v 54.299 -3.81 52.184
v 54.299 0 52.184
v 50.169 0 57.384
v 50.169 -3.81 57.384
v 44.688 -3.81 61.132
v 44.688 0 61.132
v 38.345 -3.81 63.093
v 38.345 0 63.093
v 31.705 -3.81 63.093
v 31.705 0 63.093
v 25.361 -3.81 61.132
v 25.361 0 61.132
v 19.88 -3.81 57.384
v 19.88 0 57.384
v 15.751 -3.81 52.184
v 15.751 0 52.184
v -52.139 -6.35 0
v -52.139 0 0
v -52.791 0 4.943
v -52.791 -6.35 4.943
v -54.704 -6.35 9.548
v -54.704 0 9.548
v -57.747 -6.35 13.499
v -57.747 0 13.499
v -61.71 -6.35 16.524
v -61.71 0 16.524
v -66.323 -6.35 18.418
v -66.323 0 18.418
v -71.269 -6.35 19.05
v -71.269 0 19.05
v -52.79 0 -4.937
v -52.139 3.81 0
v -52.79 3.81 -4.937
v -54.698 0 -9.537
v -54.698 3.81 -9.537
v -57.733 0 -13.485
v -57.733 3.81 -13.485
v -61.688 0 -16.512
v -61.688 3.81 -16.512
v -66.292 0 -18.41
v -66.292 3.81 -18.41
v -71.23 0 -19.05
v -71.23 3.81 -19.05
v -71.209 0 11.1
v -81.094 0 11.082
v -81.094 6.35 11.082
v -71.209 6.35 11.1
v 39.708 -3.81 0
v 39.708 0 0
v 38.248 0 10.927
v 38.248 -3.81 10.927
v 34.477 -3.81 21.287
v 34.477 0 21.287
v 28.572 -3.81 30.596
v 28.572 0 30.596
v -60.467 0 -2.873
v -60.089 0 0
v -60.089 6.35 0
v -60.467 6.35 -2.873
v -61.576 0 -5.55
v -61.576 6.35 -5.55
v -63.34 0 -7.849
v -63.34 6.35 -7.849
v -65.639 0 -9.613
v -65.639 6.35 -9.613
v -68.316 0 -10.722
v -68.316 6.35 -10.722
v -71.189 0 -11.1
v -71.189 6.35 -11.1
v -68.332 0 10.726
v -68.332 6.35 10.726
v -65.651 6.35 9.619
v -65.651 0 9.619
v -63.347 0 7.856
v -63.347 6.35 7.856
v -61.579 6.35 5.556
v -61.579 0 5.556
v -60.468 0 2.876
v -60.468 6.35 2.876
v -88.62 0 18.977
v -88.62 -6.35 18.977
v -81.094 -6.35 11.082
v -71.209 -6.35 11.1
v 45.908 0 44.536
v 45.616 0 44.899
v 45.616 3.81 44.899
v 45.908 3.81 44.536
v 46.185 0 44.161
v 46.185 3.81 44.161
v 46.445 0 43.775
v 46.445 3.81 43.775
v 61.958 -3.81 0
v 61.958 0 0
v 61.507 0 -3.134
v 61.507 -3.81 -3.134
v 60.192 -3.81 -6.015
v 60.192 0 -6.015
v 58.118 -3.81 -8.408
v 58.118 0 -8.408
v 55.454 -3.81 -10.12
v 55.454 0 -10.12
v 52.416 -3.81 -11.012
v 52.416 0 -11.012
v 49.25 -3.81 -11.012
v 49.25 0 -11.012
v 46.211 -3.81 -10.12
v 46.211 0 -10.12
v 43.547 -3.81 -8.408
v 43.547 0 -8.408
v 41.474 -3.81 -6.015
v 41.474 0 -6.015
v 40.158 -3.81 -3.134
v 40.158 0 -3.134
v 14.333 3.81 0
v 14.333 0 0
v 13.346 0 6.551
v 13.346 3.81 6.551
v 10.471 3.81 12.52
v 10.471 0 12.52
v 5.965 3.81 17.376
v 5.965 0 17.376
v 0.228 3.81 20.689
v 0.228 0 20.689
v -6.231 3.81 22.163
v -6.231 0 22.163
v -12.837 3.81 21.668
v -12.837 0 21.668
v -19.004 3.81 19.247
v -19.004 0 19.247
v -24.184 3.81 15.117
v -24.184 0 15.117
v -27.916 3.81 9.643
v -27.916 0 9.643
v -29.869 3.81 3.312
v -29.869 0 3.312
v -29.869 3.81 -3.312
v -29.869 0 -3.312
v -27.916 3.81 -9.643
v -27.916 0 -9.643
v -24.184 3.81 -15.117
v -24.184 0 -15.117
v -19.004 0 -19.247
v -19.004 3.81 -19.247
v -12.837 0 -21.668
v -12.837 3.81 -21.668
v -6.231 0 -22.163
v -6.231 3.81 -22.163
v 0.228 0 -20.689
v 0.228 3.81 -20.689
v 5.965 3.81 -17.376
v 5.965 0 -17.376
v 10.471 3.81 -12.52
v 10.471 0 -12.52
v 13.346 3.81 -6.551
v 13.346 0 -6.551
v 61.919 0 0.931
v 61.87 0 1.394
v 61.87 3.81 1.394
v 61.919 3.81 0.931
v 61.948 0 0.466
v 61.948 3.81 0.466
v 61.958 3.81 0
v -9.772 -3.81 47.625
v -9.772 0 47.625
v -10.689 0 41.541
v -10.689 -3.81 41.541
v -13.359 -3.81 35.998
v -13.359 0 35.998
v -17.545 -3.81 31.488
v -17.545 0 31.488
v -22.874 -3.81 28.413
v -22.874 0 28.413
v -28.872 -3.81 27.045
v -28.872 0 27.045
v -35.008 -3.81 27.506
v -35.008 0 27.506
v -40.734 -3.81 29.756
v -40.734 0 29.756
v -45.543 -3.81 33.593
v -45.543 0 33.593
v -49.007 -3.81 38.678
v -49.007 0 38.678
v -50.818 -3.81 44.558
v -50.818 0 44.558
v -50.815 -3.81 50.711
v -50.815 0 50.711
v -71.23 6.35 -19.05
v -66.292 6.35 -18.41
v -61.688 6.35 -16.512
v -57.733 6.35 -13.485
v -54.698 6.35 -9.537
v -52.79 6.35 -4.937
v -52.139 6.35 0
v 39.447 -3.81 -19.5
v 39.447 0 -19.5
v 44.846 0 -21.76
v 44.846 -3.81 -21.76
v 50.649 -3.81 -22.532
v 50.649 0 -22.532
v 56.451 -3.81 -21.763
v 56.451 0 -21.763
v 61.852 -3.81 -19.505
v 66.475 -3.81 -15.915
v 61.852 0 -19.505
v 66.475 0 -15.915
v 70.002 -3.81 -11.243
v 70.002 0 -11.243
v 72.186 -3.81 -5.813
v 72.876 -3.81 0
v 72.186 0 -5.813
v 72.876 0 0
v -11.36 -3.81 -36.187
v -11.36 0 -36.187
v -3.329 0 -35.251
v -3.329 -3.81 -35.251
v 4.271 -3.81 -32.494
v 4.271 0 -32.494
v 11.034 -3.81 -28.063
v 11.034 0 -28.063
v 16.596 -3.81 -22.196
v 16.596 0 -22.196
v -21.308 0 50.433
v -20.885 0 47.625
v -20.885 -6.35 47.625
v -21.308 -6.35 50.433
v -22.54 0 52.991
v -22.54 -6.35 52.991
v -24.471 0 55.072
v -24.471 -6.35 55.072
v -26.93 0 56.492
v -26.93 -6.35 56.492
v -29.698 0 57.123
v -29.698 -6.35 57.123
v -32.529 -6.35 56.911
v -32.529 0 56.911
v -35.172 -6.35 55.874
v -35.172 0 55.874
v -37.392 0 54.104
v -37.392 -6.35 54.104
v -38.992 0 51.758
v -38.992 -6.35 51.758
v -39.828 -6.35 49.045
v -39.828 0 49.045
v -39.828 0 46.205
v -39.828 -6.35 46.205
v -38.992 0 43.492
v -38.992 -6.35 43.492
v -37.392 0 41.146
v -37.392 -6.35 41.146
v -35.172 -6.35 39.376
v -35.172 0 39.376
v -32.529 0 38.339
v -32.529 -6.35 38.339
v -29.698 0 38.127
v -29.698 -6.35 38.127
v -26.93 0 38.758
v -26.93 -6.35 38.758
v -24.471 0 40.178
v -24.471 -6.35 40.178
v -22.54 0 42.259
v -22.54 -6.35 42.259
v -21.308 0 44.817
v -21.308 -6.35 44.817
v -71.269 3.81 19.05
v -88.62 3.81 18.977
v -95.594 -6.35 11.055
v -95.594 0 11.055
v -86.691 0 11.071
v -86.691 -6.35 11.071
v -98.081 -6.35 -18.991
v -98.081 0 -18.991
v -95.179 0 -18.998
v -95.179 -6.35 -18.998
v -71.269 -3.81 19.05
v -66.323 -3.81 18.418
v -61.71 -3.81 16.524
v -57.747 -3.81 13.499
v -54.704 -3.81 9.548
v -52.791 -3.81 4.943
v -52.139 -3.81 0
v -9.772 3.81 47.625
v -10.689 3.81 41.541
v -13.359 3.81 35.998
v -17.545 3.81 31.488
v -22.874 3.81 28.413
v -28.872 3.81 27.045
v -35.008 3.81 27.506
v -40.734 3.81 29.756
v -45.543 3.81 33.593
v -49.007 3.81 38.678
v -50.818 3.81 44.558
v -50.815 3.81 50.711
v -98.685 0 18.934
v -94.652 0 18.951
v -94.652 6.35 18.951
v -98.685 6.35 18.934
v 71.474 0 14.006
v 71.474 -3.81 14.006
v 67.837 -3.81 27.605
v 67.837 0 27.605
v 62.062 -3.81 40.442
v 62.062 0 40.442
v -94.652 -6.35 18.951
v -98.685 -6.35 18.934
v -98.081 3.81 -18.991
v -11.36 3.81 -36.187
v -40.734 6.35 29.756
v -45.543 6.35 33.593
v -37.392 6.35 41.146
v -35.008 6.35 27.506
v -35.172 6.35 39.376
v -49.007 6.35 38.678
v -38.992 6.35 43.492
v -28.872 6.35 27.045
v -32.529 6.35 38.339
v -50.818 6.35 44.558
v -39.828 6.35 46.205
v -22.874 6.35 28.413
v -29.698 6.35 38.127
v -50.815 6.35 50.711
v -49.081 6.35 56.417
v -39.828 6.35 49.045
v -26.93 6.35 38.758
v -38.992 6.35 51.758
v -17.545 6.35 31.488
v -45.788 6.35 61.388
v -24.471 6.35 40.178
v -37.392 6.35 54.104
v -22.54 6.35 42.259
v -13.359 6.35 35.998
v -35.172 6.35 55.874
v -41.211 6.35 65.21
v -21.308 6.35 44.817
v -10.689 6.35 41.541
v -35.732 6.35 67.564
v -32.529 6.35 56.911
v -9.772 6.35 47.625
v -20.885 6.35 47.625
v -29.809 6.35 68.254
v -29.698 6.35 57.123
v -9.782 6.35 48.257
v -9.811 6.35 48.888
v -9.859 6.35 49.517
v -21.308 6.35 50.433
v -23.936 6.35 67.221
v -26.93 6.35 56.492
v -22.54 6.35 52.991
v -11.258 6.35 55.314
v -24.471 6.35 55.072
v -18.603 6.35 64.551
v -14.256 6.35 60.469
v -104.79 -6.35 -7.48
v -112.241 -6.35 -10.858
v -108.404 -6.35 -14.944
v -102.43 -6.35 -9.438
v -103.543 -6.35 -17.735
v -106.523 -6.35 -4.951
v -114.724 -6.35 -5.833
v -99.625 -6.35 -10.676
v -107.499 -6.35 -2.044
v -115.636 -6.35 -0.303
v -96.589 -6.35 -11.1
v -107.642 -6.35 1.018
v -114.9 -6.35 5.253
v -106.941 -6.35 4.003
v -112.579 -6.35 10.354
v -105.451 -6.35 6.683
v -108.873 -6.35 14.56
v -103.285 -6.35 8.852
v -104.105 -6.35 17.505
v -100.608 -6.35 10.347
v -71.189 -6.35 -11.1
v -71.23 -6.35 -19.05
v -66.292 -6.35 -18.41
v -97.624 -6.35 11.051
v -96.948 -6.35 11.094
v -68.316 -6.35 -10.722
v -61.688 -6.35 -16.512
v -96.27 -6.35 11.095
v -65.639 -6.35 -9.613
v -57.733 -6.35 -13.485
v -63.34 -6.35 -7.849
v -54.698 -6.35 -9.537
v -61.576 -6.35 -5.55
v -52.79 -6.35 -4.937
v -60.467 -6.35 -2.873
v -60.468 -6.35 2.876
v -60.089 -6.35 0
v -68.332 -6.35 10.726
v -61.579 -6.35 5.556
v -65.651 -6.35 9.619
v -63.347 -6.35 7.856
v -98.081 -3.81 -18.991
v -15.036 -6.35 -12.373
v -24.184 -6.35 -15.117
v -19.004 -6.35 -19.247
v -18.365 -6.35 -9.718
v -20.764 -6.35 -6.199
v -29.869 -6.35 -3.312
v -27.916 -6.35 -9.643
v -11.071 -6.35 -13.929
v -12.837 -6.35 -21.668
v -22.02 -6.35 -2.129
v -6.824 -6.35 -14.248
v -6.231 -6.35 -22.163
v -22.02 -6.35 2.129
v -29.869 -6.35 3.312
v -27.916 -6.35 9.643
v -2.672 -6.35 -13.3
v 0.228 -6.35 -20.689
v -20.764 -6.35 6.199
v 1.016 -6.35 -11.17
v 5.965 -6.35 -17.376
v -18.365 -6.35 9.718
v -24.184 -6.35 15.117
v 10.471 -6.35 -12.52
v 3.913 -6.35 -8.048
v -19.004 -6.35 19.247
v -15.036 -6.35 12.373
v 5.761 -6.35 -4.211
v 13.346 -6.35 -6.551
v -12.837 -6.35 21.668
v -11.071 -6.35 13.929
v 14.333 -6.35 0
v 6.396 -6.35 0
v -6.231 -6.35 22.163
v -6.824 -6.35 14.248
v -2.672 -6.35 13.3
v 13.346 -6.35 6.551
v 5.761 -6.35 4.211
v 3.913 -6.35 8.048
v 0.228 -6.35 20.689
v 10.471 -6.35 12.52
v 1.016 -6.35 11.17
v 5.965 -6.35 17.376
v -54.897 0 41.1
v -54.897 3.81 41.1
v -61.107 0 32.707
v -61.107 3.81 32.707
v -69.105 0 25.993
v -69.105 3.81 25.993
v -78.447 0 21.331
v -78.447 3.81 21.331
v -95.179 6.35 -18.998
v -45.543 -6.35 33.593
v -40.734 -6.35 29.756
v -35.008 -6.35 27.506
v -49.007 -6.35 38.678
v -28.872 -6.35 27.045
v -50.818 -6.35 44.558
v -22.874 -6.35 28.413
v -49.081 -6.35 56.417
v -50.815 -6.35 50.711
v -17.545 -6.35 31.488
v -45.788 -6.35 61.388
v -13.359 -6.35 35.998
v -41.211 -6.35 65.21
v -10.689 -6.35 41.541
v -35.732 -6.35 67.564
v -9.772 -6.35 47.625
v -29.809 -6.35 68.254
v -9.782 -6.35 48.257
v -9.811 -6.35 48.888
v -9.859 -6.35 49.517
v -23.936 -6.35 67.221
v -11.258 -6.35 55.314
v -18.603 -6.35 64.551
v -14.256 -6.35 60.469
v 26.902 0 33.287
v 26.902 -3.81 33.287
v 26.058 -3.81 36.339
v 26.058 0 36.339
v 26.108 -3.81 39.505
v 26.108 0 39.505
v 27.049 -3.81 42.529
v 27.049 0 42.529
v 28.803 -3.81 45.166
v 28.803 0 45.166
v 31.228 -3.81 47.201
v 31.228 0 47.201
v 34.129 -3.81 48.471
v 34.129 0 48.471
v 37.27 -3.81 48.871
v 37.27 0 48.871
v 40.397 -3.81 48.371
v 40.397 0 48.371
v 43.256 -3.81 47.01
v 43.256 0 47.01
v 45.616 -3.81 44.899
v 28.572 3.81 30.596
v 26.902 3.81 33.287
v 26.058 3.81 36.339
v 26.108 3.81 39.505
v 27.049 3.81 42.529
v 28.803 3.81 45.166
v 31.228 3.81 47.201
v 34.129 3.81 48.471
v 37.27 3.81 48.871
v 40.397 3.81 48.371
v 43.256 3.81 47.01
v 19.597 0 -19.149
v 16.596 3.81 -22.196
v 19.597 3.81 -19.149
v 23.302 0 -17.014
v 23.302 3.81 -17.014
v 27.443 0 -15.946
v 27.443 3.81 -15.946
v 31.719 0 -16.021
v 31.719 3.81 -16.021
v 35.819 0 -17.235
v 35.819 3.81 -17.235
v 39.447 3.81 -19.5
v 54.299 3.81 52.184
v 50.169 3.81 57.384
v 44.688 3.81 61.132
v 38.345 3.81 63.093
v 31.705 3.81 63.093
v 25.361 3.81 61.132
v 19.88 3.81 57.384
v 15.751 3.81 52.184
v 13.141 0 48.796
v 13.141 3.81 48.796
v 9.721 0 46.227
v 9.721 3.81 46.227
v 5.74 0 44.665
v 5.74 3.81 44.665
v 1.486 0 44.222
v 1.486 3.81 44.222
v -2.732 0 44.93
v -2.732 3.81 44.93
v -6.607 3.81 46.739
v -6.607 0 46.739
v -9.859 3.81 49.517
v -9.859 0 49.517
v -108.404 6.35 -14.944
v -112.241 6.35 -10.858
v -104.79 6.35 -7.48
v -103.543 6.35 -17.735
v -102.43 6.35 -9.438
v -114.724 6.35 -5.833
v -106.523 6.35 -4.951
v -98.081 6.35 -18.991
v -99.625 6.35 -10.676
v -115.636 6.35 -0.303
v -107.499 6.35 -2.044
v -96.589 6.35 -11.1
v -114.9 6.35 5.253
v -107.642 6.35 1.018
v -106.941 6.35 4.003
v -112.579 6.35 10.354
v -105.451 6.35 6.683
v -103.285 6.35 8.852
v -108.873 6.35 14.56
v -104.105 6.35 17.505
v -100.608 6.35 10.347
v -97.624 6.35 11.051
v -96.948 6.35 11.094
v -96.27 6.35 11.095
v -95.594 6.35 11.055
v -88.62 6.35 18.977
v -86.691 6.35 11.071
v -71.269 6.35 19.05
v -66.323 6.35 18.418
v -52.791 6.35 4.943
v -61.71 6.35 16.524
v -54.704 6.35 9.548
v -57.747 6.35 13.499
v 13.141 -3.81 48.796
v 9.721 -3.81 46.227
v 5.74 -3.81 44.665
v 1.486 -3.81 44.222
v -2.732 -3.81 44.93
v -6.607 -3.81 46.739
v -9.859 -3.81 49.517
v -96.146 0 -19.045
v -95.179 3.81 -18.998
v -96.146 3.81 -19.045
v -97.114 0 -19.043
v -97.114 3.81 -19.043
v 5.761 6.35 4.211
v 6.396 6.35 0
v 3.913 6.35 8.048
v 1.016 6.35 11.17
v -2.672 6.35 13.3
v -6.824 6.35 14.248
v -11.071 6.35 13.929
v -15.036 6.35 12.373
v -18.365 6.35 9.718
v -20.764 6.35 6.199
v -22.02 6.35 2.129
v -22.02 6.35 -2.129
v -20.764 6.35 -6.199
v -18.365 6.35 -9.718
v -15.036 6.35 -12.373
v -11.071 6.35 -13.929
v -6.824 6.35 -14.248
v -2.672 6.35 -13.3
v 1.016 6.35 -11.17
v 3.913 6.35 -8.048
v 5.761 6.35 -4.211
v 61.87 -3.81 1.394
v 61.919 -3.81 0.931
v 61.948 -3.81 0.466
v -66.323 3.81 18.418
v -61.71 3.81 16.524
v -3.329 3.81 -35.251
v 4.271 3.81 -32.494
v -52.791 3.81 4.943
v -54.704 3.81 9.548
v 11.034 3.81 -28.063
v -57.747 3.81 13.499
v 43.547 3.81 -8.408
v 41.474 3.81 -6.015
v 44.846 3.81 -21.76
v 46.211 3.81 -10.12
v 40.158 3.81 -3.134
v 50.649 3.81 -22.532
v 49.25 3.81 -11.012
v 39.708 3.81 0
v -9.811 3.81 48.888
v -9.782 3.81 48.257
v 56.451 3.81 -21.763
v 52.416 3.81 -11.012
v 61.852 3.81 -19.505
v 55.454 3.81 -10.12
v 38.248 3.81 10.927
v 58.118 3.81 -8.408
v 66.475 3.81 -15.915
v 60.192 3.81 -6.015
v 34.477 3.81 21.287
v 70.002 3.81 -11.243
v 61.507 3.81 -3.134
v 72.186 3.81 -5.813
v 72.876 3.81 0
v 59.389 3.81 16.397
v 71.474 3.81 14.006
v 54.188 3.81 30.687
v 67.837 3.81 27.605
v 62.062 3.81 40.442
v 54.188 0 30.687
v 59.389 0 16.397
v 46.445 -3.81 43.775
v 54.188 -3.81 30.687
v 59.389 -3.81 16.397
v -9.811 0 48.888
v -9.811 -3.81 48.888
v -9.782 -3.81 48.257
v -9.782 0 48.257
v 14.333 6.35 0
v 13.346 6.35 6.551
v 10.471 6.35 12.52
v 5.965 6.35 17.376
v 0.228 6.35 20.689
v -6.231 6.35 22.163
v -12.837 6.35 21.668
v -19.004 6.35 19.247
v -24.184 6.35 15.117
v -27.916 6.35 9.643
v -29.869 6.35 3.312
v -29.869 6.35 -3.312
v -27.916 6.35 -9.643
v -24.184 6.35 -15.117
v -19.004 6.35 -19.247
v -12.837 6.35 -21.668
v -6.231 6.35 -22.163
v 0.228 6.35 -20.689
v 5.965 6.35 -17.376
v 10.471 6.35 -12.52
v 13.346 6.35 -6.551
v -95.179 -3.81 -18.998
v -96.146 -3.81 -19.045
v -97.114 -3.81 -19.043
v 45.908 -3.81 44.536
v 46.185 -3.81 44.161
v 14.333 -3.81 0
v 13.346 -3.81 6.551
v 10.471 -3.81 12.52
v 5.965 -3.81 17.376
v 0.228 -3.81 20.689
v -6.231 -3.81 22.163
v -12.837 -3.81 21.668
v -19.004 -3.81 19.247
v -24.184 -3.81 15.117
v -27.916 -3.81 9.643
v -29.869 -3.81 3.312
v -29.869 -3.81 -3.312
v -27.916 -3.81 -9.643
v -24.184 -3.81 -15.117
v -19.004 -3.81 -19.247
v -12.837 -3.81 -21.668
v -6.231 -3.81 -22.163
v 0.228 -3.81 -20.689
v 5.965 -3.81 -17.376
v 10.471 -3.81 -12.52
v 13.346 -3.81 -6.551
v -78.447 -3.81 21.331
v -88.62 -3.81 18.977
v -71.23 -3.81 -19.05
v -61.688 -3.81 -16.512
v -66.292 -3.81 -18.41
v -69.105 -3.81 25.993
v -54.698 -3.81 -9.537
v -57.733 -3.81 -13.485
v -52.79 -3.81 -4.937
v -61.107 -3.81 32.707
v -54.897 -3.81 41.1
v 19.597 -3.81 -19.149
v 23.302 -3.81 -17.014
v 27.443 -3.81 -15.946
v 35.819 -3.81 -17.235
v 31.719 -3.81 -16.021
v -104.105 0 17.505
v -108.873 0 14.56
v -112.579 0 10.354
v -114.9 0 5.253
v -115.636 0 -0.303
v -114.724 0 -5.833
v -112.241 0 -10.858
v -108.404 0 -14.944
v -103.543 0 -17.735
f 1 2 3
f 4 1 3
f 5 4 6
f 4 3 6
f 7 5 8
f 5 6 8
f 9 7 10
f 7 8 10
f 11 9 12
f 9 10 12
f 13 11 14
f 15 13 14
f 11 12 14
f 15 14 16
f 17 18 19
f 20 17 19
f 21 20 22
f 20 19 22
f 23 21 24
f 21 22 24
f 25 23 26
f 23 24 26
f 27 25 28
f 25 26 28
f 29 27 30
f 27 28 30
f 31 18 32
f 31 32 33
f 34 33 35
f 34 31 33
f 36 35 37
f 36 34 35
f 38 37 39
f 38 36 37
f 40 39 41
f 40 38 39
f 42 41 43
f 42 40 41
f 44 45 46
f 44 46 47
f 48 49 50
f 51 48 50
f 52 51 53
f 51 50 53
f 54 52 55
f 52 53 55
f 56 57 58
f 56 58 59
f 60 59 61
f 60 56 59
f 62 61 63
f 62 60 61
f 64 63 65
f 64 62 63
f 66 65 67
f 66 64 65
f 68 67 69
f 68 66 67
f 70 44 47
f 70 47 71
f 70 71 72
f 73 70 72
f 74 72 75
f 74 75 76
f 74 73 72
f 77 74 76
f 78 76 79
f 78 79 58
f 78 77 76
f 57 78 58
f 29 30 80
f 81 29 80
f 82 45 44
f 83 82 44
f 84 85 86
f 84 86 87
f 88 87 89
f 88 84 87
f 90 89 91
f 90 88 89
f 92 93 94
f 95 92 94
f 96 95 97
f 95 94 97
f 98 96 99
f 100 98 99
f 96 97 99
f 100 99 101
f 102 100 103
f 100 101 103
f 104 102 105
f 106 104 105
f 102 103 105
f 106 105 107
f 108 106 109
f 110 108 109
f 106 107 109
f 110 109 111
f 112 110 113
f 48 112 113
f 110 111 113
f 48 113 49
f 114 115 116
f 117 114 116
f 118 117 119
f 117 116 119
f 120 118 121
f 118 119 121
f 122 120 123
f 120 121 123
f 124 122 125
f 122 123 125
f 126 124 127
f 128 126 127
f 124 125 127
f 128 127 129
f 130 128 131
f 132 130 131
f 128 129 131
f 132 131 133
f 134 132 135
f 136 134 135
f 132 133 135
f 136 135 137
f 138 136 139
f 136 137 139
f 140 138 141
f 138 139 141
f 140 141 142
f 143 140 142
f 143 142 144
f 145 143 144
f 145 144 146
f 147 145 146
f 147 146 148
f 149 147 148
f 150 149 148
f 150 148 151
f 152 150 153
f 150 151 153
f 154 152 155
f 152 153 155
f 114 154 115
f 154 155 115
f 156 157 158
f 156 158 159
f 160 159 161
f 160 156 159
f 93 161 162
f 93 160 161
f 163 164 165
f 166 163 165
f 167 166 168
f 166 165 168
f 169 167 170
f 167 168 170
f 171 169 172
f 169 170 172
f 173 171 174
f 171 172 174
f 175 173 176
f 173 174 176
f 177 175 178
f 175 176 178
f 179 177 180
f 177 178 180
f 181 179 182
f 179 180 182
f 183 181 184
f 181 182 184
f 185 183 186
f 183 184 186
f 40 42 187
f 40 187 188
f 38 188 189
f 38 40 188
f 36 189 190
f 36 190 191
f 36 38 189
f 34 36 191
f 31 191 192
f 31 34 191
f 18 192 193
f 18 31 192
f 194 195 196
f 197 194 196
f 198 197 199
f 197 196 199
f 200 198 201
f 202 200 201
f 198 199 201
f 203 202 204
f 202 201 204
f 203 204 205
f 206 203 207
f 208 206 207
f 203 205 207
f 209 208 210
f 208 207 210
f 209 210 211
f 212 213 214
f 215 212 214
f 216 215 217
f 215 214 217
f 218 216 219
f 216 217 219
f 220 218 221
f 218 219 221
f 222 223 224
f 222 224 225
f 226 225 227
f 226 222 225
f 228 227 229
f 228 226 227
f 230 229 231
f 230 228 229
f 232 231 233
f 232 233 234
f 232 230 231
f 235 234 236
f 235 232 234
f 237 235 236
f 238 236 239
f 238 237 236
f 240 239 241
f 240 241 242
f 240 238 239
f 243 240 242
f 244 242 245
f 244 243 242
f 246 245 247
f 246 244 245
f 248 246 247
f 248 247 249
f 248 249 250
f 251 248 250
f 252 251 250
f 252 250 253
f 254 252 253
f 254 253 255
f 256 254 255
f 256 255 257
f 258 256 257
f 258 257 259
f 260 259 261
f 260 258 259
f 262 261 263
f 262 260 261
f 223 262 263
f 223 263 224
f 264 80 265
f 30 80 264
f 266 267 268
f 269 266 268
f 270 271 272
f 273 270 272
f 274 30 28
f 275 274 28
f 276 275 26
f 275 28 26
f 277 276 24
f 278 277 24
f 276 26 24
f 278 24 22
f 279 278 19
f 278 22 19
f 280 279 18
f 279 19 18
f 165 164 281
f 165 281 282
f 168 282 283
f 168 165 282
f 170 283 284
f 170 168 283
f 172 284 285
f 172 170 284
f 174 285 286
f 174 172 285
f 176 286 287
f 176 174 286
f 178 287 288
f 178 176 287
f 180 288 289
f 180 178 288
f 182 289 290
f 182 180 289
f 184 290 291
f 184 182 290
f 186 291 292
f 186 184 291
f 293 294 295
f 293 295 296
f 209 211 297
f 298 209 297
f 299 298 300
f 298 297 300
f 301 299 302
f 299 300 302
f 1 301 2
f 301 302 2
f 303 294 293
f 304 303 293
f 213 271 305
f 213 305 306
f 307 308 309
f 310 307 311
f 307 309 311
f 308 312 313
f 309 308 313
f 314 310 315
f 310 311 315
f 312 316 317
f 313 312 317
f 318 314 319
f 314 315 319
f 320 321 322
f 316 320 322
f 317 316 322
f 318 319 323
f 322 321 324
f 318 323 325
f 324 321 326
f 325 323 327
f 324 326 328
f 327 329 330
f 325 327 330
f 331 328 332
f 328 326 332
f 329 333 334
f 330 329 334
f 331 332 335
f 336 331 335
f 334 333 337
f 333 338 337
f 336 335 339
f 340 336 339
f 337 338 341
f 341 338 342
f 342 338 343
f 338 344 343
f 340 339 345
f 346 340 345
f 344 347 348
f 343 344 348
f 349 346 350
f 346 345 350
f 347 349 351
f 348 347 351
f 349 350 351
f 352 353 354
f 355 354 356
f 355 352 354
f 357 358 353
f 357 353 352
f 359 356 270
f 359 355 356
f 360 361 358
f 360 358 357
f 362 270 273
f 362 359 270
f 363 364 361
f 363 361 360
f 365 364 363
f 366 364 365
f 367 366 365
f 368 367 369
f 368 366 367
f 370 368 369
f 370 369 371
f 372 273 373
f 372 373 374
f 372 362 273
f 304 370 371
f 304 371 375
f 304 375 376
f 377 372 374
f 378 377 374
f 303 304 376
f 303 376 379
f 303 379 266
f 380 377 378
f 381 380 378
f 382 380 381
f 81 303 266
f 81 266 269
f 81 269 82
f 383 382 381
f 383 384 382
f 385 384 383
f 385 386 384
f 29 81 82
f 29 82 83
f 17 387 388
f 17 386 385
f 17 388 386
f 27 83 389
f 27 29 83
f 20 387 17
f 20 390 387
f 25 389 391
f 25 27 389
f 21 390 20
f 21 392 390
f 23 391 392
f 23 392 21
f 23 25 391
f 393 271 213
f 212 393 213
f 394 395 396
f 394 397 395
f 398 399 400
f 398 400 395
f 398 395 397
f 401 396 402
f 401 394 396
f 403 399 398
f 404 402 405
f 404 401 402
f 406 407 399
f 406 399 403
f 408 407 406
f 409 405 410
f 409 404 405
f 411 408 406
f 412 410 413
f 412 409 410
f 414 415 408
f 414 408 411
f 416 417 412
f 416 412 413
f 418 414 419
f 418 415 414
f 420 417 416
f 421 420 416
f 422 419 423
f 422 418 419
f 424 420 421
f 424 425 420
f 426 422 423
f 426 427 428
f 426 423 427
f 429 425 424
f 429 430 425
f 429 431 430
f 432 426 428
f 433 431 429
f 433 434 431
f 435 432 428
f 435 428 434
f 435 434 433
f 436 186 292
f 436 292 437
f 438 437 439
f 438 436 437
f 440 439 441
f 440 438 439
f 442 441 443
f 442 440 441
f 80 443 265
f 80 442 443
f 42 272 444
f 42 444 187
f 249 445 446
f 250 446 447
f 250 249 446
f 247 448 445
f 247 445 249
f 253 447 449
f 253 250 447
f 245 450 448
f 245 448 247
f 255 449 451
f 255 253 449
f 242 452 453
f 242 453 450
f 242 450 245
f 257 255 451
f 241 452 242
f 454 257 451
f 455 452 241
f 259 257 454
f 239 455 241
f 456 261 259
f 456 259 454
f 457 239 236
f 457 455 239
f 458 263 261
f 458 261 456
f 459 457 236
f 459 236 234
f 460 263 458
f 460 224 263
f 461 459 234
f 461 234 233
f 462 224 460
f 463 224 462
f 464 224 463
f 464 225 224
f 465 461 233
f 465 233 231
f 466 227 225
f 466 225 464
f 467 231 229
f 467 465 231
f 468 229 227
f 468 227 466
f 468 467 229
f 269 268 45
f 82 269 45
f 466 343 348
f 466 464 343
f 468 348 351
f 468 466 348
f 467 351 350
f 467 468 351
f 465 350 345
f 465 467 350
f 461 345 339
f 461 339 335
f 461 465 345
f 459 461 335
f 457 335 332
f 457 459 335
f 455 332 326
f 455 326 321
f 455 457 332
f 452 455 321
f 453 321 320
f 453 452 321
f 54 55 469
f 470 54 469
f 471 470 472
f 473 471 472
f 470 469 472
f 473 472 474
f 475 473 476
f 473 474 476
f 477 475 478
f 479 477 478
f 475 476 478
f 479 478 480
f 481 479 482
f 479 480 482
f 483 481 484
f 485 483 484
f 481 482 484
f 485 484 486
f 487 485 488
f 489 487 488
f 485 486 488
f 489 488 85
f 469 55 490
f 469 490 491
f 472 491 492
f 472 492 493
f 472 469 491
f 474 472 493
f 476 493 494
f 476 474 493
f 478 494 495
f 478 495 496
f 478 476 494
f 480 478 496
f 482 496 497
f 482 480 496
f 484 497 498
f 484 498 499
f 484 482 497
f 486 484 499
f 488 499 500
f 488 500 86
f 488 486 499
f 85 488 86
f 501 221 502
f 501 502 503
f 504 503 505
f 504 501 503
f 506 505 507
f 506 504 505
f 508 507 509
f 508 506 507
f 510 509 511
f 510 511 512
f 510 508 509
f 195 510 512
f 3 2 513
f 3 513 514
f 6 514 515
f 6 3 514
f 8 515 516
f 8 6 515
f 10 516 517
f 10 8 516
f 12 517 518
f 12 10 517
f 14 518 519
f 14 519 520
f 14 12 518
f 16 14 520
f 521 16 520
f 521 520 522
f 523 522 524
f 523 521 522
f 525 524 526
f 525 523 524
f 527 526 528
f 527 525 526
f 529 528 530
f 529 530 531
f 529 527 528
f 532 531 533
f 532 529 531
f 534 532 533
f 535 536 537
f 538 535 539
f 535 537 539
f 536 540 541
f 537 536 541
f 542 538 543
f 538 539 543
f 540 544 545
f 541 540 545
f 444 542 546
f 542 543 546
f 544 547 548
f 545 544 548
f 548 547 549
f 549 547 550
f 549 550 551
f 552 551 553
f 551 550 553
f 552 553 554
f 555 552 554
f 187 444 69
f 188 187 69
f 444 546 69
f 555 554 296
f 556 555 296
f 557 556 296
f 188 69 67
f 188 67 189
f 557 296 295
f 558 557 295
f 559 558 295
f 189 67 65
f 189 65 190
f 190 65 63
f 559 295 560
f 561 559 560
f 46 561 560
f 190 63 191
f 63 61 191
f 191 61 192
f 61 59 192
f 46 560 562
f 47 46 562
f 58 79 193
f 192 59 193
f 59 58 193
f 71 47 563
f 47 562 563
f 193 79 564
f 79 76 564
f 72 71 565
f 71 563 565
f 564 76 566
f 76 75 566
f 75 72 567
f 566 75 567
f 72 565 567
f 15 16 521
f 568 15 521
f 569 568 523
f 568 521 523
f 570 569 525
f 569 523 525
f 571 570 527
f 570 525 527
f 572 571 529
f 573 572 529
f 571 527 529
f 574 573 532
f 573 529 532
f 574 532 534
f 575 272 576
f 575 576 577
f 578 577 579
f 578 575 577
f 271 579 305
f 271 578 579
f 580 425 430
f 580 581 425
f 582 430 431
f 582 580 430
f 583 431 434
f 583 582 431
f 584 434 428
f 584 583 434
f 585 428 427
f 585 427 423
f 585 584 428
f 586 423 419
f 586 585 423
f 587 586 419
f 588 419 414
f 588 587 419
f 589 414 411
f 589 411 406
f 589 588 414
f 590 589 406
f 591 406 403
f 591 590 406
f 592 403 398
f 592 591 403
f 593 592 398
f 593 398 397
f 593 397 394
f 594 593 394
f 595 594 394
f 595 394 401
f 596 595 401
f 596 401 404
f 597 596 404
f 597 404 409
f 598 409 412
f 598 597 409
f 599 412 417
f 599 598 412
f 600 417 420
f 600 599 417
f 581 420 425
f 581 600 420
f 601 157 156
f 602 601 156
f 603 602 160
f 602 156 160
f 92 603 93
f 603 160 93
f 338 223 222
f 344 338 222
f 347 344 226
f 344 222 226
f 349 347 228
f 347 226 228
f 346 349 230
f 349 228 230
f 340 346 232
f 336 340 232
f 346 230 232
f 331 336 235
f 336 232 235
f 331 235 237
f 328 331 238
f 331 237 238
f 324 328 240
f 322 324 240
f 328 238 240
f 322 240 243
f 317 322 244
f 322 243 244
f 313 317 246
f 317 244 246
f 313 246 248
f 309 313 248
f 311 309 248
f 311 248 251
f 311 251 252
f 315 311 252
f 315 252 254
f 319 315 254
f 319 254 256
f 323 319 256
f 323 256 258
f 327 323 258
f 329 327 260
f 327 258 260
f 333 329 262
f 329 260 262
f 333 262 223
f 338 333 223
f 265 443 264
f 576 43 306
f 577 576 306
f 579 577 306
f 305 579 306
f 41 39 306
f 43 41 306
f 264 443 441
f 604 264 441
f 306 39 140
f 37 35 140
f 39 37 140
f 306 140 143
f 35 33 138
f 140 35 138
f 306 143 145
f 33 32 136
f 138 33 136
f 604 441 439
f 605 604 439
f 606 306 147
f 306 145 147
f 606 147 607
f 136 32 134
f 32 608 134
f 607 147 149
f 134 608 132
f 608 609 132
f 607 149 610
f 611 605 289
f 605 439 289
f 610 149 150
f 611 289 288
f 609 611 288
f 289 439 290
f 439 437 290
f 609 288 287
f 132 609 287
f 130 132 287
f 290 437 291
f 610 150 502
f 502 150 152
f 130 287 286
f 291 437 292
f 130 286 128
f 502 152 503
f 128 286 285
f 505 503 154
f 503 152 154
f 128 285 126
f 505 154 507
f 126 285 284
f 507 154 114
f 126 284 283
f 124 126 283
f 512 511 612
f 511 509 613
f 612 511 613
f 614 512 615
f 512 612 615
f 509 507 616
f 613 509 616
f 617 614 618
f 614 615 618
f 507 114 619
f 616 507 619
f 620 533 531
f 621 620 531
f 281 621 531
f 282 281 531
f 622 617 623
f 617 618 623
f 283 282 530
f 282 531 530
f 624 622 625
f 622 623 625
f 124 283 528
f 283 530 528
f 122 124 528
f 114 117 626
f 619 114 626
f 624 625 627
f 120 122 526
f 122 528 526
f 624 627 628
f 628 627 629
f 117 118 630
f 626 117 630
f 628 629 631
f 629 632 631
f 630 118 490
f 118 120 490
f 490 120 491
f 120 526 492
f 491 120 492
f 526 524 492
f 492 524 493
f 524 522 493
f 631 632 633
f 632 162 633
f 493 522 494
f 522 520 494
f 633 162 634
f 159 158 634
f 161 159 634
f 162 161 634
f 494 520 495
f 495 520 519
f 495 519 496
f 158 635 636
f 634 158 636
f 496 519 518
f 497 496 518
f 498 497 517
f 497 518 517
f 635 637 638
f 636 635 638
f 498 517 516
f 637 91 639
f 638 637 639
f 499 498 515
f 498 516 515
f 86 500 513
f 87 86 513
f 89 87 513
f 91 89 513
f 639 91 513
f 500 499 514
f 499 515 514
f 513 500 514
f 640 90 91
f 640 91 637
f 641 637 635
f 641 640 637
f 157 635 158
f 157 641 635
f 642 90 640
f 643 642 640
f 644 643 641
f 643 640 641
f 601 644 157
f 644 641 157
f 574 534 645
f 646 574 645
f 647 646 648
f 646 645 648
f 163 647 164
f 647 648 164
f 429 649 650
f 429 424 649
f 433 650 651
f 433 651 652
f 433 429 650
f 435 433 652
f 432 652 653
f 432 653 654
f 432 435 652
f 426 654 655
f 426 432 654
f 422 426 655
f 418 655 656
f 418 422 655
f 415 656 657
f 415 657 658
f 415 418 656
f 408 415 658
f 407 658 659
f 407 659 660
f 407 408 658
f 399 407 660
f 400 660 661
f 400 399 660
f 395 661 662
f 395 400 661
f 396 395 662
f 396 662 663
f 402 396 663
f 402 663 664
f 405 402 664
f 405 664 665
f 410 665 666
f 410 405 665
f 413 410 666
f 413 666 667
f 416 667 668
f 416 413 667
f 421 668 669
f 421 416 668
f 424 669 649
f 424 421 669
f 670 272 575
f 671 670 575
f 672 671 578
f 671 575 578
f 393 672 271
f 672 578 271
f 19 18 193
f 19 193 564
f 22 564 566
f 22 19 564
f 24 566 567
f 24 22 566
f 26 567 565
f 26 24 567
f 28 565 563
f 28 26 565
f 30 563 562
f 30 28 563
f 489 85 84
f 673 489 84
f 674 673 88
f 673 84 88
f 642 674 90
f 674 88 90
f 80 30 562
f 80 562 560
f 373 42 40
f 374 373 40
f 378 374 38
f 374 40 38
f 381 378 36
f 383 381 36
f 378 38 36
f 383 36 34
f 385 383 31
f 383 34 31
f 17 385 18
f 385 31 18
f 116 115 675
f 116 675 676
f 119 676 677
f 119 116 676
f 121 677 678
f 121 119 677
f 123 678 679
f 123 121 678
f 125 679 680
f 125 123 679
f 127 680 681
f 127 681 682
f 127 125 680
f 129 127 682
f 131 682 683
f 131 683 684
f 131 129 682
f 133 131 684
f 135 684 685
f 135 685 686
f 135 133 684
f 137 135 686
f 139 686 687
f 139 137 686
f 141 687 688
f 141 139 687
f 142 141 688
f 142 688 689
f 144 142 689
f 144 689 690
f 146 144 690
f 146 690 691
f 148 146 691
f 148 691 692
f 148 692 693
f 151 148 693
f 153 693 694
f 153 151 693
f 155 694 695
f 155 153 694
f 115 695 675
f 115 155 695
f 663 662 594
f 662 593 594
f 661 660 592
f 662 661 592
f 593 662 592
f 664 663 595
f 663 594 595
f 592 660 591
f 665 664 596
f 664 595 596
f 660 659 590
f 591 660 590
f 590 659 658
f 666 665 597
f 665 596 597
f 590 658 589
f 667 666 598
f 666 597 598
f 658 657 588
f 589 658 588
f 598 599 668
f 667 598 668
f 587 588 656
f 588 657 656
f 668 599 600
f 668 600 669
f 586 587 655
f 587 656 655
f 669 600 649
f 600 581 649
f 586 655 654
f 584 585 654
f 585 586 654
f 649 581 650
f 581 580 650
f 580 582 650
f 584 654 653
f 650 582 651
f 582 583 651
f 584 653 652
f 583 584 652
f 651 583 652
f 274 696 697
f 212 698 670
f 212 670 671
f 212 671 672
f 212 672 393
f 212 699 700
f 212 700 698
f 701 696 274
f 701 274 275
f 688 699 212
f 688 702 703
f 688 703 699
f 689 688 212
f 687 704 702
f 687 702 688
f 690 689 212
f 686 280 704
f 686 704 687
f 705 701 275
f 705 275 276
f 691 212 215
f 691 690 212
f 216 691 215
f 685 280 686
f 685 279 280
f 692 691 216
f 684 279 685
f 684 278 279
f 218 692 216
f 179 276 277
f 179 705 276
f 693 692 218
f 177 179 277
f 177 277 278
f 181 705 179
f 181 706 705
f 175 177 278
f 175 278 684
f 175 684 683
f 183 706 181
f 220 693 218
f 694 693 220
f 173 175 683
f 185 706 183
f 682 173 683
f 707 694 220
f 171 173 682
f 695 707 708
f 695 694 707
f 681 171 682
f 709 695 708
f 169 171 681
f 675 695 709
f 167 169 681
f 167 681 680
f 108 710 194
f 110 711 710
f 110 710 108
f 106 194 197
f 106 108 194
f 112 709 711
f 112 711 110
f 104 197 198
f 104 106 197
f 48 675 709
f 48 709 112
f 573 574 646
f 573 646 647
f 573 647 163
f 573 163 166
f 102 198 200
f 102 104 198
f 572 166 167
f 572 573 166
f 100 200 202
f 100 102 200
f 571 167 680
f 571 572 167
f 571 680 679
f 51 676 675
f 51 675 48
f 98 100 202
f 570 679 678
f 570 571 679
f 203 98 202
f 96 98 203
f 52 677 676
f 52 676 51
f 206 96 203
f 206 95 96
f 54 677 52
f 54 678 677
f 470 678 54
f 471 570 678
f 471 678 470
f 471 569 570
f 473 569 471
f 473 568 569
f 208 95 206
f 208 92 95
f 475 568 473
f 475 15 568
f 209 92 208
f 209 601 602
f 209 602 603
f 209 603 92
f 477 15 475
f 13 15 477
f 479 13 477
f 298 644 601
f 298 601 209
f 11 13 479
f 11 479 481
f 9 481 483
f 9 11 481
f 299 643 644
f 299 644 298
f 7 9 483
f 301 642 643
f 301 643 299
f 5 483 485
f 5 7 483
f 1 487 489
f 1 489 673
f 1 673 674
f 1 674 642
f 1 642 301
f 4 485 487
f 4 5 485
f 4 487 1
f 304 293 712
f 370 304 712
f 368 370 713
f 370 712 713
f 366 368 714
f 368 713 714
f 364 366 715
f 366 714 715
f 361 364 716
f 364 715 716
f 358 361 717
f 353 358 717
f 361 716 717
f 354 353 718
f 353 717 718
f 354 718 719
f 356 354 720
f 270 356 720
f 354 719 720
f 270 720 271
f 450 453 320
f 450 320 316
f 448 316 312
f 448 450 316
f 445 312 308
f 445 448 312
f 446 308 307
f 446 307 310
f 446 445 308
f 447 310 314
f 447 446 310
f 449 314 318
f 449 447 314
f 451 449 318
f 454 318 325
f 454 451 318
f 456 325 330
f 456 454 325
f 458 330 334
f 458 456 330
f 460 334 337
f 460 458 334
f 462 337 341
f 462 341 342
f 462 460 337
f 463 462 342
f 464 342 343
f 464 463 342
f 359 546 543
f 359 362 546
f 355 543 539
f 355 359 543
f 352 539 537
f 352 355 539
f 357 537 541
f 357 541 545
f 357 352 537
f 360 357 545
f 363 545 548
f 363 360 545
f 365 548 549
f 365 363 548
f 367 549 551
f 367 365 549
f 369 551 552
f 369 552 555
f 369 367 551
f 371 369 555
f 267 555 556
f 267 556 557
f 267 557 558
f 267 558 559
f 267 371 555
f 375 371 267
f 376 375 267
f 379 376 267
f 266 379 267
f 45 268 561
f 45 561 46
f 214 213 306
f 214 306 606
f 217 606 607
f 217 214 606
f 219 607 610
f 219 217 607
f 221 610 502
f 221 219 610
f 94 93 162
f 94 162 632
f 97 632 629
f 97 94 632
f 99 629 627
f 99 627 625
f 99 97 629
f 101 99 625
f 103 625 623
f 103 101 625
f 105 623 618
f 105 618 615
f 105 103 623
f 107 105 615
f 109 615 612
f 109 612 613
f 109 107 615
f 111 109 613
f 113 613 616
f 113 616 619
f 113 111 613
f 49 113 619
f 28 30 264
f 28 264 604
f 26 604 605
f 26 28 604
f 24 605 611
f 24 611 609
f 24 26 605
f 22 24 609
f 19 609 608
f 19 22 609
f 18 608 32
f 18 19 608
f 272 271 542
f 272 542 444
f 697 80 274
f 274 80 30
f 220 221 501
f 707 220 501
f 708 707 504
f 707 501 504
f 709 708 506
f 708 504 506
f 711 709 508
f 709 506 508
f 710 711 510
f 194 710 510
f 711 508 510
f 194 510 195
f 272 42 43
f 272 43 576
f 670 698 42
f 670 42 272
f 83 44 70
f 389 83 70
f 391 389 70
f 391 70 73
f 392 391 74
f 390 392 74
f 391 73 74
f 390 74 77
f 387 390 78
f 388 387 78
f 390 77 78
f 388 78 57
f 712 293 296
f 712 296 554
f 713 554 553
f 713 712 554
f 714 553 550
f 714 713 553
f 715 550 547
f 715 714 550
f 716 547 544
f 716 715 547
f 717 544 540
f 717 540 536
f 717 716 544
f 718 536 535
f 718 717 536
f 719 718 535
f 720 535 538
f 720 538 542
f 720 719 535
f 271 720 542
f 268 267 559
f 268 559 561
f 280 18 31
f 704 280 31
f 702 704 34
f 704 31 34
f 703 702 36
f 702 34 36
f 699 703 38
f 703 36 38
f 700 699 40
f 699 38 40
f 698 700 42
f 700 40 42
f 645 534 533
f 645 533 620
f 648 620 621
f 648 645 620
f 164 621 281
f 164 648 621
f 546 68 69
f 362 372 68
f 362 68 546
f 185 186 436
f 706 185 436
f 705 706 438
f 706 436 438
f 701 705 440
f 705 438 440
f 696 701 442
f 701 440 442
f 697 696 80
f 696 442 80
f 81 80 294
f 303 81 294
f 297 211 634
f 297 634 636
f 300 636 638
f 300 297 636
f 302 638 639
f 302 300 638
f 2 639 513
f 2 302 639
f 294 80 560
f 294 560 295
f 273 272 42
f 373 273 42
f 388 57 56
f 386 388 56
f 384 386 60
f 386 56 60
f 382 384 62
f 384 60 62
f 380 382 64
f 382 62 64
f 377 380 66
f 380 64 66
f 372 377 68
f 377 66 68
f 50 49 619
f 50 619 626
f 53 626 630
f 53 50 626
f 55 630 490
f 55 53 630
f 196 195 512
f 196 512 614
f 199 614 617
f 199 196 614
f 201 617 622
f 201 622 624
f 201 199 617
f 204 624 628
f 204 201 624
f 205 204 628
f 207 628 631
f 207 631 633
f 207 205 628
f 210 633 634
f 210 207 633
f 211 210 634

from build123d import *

# Parameters (mm, degrees)
F0_R     = 22.225
F1_DEPTH = 3.81
F2_DEPTH = 6.35
F0_R_2   = 9.525
F0_R_3   = 14.2875


with BuildPart() as f1:
    # F0 (on Front) → F1 (new body, symmetric)
    with BuildSketch(Plane.XZ):
        with BuildLine():
            Line((-71.2302067148, -19.0499547752), (-95.1790091363, -18.9977704048))
            ThreePointArc((-95.1790091363, -18.9977704048), (-96.6302067148, -19.0499547752), (-98.0811630947, -18.9914466199))
            Line((-98.0811630947, -18.9914466199), (-11.3598450249, -36.1872298845))
            ThreePointArc((-11.3598450249, -36.1872298845), (4.2709346458, -32.4941742986), (16.5960399757, -22.1960331421))
            ThreePointArc((16.5960399757, -22.1960331421), (27.4429735853, -15.9457724279), (39.4467694666, -19.4997296822))
            ThreePointArc((39.4467694666, -19.4997296822), (61.8517288175, -19.5048009495), (72.8764723136, 0))
            ThreePointArc((72.8764723136, 0), (67.8374893071, 27.6050269049), (54.2986201889, 52.1840399681))
            ThreePointArc((54.2986201889, 52.1840399681), (35.0247812601, 63.3424344385), (15.7509423313, 52.1840399681))
            ThreePointArc((15.7509423313, 52.1840399681), (3.628009846, 44.2991231357), (-9.8592897487, 49.517375251))
            ThreePointArc((-9.8592897487, 49.517375251), (-9.7940926646, 48.5721857626), (-9.7723450249, 47.625))
            ThreePointArc((-9.7723450249, 47.625), (-31.9572082975, 27.0455910398), (-50.8153078986, 50.7110154181))
            ThreePointArc((-50.8153078986, 50.7110154181), (-64.9081681748, 29.1142899479), (-88.6201192568, 18.9767045507))
            Line((-88.6201192568, 18.9767045507), (-71.2689823238, 19.0498308196))
            ThreePointArc((-71.2689823238, 19.0498308196), (-57.7467278848, 13.4987395145), (-52.1386969191, 0))
            ThreePointArc((-52.1386969191, 0), (-57.7329966699, -13.4850521246), (-71.2302067148, -19.0499547752))
        make_face()
        with Locations((-7.8918969191, 0)):
            Circle(F0_R, mode=Mode.SUBTRACT)
        with BuildLine():
            ThreePointArc((61.9581030809, 0), (50.8329030809, -11.1252), (39.7077030809, 0))
            ThreePointArc((39.7077030809, 0), (36.6426092928, 16.2092346589), (28.5715121556, 30.596433106))
            ThreePointArc((28.5715121556, 30.596433106), (29.9427690789, 46.2699714599), (45.6163074327, 44.8987145366))
            ThreePointArc((45.6163074327, 44.8987145366), (46.0483474014, 44.3497039456), (46.4450767121, 43.7746587147))
            ThreePointArc((46.4450767121, 43.7746587147), (57.1198457607, 23.6623392132), (61.8704480271, 1.3937993402))
            ThreePointArc((61.8704480271, 1.3937993402), (61.9361676926, 0.6982764512), (61.9581030809, 0))
        make_face(mode=Mode.SUBTRACT)
    extrude(amount=F1_DEPTH, both=True)


with BuildPart() as f2:
    # F0 (on Front) → F2 (new body, symmetric)
    with BuildSketch(Plane.XZ):
        with BuildLine():
            ThreePointArc((-96.5886969191, -11.0998), (-107.6764020371, -0.5180301702), (-97.6236283177, 11.0514468302))
            ThreePointArc((-97.6236283177, 11.0514468302), (-96.6090077674, 11.0997814172), (-95.5942171229, 11.0551603324))
            Line((-95.5942171229, 11.0551603324), (-86.6911309222, 11.0714515751))
            ThreePointArc((-86.6911309222, 11.0714515751), (-85.3763591725, 12.7126999407), (-83.8886969191, 14.1990316571))
            ThreePointArc((-83.8886969191, 14.1990316571), (-88.8942032902, 17.4269121704), (-94.6518588651, 18.9512838181))
            Line((-94.6518588651, 18.9512838181), (-98.6852034909, 18.9342853098))
            ThreePointArc((-98.6852034909, 18.9342853098), (-115.6362812002, -0.3033695006), (-98.0811630947, -18.9914466199))
            Line((-98.0811630947, -18.9914466199), (-95.1790091363, -18.9977704048))
            ThreePointArc((-95.1790091363, -18.9977704048), (-89.1369994129, -17.5321049585), (-83.8886969191, -14.1990316571))
            ThreePointArc((-83.8886969191, -14.1990316571), (-85.3647221317, -12.7256751951), (-86.6708459935, -11.0998))
            Line((-86.6708459935, -11.0998), (-96.5886969191, -11.0998))
        make_face()
        with BuildLine():
            Line((-81.1065478448, -11.0998), (-86.6708459935, -11.0998))
            ThreePointArc((-86.6708459935, -11.0998), (-85.3647221317, -12.7256751951), (-83.8886969191, -14.1990316571))
            ThreePointArc((-83.8886969191, -14.1990316571), (-82.4126717065, -12.7256751951), (-81.1065478448, -11.0998))
        make_face()
        with BuildLine():
            ThreePointArc((-83.8886969191, 14.1990316571), (-85.3763591725, 12.7126999407), (-86.6911309222, 11.0714515751))
            Line((-86.6911309222, 11.0714515751), (-81.0935830583, 11.0816942043))
            ThreePointArc((-81.0935830583, 11.0816942043), (-82.4052361424, 12.7173873258), (-83.8886969191, 14.1990316571))
        make_face()
        with BuildLine():
            Line((-71.1886969191, -11.0998), (-81.1065478448, -11.0998))
            ThreePointArc((-81.1065478448, -11.0998), (-82.4126717065, -12.7256751951), (-83.8886969191, -14.1990316571))
            ThreePointArc((-83.8886969191, -14.1990316571), (-78.0055423584, -17.7885670659), (-71.2302067148, -19.0499547752))
            ThreePointArc((-71.2302067148, -19.0499547752), (-57.7329966699, -13.4850521246), (-52.1386969191, 0))
            ThreePointArc((-52.1386969191, 0), (-57.7467278848, 13.4987395145), (-71.2689823238, 19.0498308196))
            ThreePointArc((-71.2689823238, 19.0498308196), (-78.0236429237, 17.7816200925), (-83.8886969191, 14.1990316571))
            ThreePointArc((-83.8886969191, 14.1990316571), (-82.4052361424, 12.7173873258), (-81.0935830583, 11.0816942043))
            Line((-81.0935830583, 11.0816942043), (-71.2090077674, 11.0997814172))
            ThreePointArc((-71.2090077674, 11.0997814172), (-63.3471373266, 7.8559215371), (-60.0888969191, 0))
            ThreePointArc((-60.0888969191, 0), (-63.3399530693, -7.8487438498), (-71.1886969191, -11.0998))
        make_face()
        with BuildLine():
            ThreePointArc((-71.2302067148, -19.0499547752), (-78.0055423584, -17.7885670659), (-83.8886969191, -14.1990316571))
            ThreePointArc((-83.8886969191, -14.1990316571), (-89.1369994129, -17.5321049585), (-95.1790091363, -18.9977704048))
            Line((-95.1790091363, -18.9977704048), (-71.2302067148, -19.0499547752))
        make_face()
        with BuildLine():
            ThreePointArc((-94.6518588651, 18.9512838181), (-88.8942032902, 17.4269121704), (-83.8886969191, 14.1990316571))
            ThreePointArc((-83.8886969191, 14.1990316571), (-78.0236429237, 17.7816200925), (-71.2689823238, 19.0498308196))
            Line((-71.2689823238, 19.0498308196), (-88.6201192568, 18.9767045507))
            Line((-88.6201192568, 18.9767045507), (-94.6518588651, 18.9512838181))
        make_face()
    extrude(amount=F2_DEPTH, both=True)


with BuildPart() as f2b:
    # F0 (on Front) → F2, piece 2 (new body, symmetric)
    with BuildSketch(Plane.XZ):
        with BuildLine():
            ThreePointArc((-9.8592897487, 49.517375251), (-29.8086319483, 68.2537408507), (-50.8153078986, 50.7110154181))
            ThreePointArc((-50.8153078986, 50.7110154181), (-31.9572082975, 27.0455910398), (-9.7723450249, 47.625))
            ThreePointArc((-9.7723450249, 47.625), (-9.7940926646, 48.5721857626), (-9.8592897487, 49.517375251))
        make_face()
        with Locations((-30.4098450249, 47.625)):
            Circle(F0_R_2, mode=Mode.SUBTRACT)
    extrude(amount=F2_DEPTH, both=True)


with BuildPart() as f2c:
    # F0 (on Front) → F2, piece 3 (new body, symmetric)
    with BuildSketch(Plane.XZ):
        with Locations((-7.8918969191, 0)):
            Circle(F0_R)
        with Locations((-7.8918969191, 0)):
            Circle(F0_R_3, mode=Mode.SUBTRACT)
    extrude(amount=F2_DEPTH, both=True)


solid = Compound([f1.part, f2.part, f2b.part, f2c.part])
